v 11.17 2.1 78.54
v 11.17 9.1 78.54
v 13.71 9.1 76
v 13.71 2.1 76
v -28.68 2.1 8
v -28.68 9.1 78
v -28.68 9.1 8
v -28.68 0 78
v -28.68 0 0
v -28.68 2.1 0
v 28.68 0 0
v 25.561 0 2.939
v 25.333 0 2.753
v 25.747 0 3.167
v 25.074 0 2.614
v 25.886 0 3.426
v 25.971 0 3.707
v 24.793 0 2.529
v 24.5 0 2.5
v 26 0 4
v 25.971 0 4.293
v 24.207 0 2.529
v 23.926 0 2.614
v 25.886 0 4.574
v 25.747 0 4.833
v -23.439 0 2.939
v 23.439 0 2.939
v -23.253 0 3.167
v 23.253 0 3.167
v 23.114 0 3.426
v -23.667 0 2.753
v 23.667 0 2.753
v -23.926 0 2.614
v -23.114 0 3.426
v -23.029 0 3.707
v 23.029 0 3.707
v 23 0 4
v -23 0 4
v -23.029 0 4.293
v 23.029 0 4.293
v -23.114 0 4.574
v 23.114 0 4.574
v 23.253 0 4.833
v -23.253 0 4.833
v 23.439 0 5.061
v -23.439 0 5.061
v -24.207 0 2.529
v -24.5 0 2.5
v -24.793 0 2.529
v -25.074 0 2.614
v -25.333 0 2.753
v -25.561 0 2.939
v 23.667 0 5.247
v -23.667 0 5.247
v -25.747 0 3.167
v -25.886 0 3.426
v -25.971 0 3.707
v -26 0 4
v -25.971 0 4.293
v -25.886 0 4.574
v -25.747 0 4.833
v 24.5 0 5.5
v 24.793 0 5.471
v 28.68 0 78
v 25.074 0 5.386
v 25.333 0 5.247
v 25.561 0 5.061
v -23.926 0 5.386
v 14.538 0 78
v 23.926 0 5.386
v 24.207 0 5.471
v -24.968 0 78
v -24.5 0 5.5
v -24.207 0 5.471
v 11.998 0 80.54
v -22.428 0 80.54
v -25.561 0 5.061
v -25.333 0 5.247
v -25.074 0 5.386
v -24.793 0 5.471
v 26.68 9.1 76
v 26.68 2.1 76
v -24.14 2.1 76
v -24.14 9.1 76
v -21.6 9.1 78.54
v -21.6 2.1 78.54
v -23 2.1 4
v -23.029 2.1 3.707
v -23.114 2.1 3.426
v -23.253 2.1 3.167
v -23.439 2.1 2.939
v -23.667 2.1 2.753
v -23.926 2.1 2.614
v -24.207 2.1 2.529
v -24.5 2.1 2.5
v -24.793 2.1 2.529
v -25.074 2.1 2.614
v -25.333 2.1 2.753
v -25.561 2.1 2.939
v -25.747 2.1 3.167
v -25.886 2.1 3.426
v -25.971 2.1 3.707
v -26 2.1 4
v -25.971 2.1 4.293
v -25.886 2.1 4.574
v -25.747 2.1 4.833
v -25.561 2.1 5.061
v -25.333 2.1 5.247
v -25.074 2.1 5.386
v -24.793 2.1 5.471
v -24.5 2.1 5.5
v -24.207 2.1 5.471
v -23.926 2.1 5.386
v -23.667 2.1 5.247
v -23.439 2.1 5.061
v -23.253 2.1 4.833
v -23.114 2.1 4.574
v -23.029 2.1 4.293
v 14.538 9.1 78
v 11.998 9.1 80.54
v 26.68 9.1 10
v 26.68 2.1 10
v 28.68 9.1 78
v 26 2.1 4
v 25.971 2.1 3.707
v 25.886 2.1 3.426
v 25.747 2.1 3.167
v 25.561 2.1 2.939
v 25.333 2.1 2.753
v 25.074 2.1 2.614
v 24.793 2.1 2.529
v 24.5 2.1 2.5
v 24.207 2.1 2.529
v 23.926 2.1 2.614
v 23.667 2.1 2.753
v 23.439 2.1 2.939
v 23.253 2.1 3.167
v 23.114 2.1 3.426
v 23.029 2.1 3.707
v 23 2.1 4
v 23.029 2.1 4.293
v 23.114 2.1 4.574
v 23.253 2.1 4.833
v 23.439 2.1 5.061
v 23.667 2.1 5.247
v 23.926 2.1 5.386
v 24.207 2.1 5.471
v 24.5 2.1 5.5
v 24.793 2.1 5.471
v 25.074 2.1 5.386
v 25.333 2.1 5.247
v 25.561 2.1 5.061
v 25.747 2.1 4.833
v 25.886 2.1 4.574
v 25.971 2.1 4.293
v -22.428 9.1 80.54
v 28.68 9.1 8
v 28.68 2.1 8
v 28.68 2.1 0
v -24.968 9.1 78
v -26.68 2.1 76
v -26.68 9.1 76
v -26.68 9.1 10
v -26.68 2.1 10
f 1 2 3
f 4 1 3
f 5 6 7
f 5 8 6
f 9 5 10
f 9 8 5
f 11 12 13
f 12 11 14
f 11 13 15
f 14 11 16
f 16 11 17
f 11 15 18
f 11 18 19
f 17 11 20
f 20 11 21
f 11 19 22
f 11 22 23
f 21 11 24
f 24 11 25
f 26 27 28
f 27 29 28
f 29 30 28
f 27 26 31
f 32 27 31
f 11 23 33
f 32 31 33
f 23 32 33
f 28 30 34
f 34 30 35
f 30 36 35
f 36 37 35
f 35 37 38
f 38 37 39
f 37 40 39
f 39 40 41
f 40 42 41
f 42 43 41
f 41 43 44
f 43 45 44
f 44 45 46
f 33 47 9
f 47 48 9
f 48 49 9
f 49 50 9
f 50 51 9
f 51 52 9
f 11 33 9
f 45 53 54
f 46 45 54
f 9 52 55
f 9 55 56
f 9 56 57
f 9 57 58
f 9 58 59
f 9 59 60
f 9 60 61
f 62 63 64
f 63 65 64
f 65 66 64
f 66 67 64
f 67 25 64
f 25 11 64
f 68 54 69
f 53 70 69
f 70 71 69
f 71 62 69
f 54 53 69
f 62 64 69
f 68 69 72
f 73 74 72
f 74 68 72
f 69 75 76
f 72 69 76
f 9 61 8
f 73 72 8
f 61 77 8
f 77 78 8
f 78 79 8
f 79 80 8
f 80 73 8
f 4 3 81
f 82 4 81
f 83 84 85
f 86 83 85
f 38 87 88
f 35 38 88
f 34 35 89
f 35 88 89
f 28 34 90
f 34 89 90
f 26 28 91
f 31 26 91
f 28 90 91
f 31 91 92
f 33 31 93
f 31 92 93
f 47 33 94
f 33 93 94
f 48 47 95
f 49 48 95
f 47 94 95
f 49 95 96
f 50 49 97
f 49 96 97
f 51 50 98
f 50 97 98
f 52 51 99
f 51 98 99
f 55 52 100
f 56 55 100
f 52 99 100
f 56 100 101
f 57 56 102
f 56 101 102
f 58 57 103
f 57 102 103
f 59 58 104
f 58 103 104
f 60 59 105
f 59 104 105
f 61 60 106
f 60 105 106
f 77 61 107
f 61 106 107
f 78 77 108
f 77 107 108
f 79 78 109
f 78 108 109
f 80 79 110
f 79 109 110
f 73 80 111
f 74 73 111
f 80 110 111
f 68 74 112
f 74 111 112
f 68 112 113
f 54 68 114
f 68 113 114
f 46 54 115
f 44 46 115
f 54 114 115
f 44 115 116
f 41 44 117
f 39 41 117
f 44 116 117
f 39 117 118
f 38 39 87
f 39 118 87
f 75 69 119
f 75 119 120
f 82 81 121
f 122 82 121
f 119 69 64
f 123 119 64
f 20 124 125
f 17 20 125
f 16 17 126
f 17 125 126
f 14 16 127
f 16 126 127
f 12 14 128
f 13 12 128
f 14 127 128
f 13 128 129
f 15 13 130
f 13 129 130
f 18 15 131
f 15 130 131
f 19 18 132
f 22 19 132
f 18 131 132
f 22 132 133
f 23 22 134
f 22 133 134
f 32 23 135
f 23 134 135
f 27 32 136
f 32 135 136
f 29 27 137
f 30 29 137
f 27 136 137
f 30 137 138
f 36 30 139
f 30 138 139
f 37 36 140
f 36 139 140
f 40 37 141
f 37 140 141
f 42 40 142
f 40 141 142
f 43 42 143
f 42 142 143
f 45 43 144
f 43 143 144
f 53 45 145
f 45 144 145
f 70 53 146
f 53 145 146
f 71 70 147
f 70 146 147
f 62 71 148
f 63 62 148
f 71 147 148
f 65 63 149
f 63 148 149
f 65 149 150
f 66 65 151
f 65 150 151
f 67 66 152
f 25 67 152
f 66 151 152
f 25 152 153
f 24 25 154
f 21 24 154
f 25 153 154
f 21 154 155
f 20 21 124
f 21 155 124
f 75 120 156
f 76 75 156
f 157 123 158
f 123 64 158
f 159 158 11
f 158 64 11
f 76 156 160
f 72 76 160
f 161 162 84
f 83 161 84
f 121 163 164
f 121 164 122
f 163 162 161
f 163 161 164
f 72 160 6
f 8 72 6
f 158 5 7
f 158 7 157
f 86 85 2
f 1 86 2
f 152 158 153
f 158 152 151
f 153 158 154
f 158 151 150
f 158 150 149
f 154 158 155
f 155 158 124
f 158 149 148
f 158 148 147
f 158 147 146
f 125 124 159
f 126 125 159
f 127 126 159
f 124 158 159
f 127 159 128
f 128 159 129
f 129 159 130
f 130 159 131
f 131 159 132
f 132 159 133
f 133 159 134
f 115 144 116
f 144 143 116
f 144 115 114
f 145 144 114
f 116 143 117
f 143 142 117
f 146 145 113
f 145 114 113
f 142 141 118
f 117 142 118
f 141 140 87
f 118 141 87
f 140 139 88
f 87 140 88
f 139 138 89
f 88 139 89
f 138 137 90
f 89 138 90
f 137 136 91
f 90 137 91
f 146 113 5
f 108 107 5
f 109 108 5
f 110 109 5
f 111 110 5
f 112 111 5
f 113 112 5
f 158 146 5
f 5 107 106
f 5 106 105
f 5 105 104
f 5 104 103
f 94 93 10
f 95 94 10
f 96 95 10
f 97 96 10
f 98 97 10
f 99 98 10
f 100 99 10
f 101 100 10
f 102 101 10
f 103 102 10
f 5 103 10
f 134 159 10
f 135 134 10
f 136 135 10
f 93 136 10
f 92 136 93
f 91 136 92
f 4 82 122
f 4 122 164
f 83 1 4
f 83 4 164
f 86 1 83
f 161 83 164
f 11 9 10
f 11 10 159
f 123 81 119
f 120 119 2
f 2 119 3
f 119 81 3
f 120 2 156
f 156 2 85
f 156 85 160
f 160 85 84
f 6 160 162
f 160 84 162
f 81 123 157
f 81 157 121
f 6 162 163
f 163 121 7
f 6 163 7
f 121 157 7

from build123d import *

# Parameters (mm, degrees)
BOSS_EXTRUDE1_DEPTH = 2.1
SKETCH2_W           = 57.36
SKETCH2_H           = 70
BOSS_EXTRUDE2_DEPTH = 7
SKETCH3_W           = 53.36
SKETCH3_H           = 66
CUT_EXTRUDE1_DEPTH  = 7
SKETCH4_R           = 1.5
CUT_EXTRUDE2_DEPTH  = 2.1
SKETCH6_W           = 40.39
SKETCH6_H           = 2
CUT_EXTRUDE3_DEPTH  = 9.1
BOSS_EXTRUDE3_DEPTH = 9.1
BOSS_EXTRUDE4_DEPTH = 2.1


with BuildPart() as part:
    # Sketch1 → Boss-Extrude1 (new body)
    with BuildSketch(Plane(origin=(0, 0, 0), x_dir=(1, 0, 0), z_dir=(0, 1, 0))):
        Polygon((28.68, 0), (28.68, -8), (28.68, -78), (-28.68, -78), (-28.68, 0), align=None)
    extrude(amount=BOSS_EXTRUDE1_DEPTH)

    # Sketch2 → Boss-Extrude2 (add)
    with BuildSketch(Plane(origin=(0, 2.1, 0), x_dir=(1, 0, 0), z_dir=(0, 1, 0))):
        with Locations((0, -43)):
            Rectangle(SKETCH2_W, SKETCH2_H)
    extrude(amount=BOSS_EXTRUDE2_DEPTH)

    # Sketch3 → Cut-Extrude1 (cut)
    with BuildSketch(Plane(origin=(0, 9.1, 0), x_dir=(1, 0, 0), z_dir=(0, 1, 0))):
        with Locations((0, -43)):
            Rectangle(SKETCH3_W, SKETCH3_H)
    extrude(amount=-CUT_EXTRUDE1_DEPTH, mode=Mode.SUBTRACT)

    # Sketch4 → Cut-Extrude2 (cut)
    with BuildSketch(Plane(origin=(0, 2.1, 0), x_dir=(1, 0, 0), z_dir=(0, 1, 0))):
        with Locations((24.5, -4)):
            Circle(SKETCH4_R)
        with Locations((-24.5, -4)):
            Circle(SKETCH4_R)
    extrude(amount=-CUT_EXTRUDE2_DEPTH, mode=Mode.SUBTRACT)

    # Sketch6 → Cut-Extrude3 (cut)
    with BuildSketch(Plane(origin=(0, 9.1, 0), x_dir=(1, 0, 0), z_dir=(0, 1, 0))):
        with Locations((-6.485, -77)):
            Rectangle(SKETCH6_W, SKETCH6_H)
    extrude(amount=-CUT_EXTRUDE3_DEPTH, mode=Mode.SUBTRACT)

    # Sketch5 → Boss-Extrude3 (add)
    with BuildSketch(Plane(origin=(0, 9.1, 0), x_dir=(1, 0, 0), z_dir=(0, 1, 0))):
        Polygon((-26.68, -76), (-24.14, -76), (-21.6, -78.54), (11.17, -78.54), (13.71, -76), (14.538427125, -76), (14.538427125, -78), (11.998427125, -80.54), (-22.428427125, -80.54), (-24.968427125, -78), (-26.68, -78), align=None)
    extrude(amount=-BOSS_EXTRUDE3_DEPTH)

    # Sketch7 → Boss-Extrude4 (add)
    with BuildSketch(Plane.XZ):
        Polygon((13.71, 76), (-24.14, 76), (-21.6, 78.54), (11.17, 78.54), align=None)
    extrude(amount=-BOSS_EXTRUDE4_DEPTH)


solid = part.part
